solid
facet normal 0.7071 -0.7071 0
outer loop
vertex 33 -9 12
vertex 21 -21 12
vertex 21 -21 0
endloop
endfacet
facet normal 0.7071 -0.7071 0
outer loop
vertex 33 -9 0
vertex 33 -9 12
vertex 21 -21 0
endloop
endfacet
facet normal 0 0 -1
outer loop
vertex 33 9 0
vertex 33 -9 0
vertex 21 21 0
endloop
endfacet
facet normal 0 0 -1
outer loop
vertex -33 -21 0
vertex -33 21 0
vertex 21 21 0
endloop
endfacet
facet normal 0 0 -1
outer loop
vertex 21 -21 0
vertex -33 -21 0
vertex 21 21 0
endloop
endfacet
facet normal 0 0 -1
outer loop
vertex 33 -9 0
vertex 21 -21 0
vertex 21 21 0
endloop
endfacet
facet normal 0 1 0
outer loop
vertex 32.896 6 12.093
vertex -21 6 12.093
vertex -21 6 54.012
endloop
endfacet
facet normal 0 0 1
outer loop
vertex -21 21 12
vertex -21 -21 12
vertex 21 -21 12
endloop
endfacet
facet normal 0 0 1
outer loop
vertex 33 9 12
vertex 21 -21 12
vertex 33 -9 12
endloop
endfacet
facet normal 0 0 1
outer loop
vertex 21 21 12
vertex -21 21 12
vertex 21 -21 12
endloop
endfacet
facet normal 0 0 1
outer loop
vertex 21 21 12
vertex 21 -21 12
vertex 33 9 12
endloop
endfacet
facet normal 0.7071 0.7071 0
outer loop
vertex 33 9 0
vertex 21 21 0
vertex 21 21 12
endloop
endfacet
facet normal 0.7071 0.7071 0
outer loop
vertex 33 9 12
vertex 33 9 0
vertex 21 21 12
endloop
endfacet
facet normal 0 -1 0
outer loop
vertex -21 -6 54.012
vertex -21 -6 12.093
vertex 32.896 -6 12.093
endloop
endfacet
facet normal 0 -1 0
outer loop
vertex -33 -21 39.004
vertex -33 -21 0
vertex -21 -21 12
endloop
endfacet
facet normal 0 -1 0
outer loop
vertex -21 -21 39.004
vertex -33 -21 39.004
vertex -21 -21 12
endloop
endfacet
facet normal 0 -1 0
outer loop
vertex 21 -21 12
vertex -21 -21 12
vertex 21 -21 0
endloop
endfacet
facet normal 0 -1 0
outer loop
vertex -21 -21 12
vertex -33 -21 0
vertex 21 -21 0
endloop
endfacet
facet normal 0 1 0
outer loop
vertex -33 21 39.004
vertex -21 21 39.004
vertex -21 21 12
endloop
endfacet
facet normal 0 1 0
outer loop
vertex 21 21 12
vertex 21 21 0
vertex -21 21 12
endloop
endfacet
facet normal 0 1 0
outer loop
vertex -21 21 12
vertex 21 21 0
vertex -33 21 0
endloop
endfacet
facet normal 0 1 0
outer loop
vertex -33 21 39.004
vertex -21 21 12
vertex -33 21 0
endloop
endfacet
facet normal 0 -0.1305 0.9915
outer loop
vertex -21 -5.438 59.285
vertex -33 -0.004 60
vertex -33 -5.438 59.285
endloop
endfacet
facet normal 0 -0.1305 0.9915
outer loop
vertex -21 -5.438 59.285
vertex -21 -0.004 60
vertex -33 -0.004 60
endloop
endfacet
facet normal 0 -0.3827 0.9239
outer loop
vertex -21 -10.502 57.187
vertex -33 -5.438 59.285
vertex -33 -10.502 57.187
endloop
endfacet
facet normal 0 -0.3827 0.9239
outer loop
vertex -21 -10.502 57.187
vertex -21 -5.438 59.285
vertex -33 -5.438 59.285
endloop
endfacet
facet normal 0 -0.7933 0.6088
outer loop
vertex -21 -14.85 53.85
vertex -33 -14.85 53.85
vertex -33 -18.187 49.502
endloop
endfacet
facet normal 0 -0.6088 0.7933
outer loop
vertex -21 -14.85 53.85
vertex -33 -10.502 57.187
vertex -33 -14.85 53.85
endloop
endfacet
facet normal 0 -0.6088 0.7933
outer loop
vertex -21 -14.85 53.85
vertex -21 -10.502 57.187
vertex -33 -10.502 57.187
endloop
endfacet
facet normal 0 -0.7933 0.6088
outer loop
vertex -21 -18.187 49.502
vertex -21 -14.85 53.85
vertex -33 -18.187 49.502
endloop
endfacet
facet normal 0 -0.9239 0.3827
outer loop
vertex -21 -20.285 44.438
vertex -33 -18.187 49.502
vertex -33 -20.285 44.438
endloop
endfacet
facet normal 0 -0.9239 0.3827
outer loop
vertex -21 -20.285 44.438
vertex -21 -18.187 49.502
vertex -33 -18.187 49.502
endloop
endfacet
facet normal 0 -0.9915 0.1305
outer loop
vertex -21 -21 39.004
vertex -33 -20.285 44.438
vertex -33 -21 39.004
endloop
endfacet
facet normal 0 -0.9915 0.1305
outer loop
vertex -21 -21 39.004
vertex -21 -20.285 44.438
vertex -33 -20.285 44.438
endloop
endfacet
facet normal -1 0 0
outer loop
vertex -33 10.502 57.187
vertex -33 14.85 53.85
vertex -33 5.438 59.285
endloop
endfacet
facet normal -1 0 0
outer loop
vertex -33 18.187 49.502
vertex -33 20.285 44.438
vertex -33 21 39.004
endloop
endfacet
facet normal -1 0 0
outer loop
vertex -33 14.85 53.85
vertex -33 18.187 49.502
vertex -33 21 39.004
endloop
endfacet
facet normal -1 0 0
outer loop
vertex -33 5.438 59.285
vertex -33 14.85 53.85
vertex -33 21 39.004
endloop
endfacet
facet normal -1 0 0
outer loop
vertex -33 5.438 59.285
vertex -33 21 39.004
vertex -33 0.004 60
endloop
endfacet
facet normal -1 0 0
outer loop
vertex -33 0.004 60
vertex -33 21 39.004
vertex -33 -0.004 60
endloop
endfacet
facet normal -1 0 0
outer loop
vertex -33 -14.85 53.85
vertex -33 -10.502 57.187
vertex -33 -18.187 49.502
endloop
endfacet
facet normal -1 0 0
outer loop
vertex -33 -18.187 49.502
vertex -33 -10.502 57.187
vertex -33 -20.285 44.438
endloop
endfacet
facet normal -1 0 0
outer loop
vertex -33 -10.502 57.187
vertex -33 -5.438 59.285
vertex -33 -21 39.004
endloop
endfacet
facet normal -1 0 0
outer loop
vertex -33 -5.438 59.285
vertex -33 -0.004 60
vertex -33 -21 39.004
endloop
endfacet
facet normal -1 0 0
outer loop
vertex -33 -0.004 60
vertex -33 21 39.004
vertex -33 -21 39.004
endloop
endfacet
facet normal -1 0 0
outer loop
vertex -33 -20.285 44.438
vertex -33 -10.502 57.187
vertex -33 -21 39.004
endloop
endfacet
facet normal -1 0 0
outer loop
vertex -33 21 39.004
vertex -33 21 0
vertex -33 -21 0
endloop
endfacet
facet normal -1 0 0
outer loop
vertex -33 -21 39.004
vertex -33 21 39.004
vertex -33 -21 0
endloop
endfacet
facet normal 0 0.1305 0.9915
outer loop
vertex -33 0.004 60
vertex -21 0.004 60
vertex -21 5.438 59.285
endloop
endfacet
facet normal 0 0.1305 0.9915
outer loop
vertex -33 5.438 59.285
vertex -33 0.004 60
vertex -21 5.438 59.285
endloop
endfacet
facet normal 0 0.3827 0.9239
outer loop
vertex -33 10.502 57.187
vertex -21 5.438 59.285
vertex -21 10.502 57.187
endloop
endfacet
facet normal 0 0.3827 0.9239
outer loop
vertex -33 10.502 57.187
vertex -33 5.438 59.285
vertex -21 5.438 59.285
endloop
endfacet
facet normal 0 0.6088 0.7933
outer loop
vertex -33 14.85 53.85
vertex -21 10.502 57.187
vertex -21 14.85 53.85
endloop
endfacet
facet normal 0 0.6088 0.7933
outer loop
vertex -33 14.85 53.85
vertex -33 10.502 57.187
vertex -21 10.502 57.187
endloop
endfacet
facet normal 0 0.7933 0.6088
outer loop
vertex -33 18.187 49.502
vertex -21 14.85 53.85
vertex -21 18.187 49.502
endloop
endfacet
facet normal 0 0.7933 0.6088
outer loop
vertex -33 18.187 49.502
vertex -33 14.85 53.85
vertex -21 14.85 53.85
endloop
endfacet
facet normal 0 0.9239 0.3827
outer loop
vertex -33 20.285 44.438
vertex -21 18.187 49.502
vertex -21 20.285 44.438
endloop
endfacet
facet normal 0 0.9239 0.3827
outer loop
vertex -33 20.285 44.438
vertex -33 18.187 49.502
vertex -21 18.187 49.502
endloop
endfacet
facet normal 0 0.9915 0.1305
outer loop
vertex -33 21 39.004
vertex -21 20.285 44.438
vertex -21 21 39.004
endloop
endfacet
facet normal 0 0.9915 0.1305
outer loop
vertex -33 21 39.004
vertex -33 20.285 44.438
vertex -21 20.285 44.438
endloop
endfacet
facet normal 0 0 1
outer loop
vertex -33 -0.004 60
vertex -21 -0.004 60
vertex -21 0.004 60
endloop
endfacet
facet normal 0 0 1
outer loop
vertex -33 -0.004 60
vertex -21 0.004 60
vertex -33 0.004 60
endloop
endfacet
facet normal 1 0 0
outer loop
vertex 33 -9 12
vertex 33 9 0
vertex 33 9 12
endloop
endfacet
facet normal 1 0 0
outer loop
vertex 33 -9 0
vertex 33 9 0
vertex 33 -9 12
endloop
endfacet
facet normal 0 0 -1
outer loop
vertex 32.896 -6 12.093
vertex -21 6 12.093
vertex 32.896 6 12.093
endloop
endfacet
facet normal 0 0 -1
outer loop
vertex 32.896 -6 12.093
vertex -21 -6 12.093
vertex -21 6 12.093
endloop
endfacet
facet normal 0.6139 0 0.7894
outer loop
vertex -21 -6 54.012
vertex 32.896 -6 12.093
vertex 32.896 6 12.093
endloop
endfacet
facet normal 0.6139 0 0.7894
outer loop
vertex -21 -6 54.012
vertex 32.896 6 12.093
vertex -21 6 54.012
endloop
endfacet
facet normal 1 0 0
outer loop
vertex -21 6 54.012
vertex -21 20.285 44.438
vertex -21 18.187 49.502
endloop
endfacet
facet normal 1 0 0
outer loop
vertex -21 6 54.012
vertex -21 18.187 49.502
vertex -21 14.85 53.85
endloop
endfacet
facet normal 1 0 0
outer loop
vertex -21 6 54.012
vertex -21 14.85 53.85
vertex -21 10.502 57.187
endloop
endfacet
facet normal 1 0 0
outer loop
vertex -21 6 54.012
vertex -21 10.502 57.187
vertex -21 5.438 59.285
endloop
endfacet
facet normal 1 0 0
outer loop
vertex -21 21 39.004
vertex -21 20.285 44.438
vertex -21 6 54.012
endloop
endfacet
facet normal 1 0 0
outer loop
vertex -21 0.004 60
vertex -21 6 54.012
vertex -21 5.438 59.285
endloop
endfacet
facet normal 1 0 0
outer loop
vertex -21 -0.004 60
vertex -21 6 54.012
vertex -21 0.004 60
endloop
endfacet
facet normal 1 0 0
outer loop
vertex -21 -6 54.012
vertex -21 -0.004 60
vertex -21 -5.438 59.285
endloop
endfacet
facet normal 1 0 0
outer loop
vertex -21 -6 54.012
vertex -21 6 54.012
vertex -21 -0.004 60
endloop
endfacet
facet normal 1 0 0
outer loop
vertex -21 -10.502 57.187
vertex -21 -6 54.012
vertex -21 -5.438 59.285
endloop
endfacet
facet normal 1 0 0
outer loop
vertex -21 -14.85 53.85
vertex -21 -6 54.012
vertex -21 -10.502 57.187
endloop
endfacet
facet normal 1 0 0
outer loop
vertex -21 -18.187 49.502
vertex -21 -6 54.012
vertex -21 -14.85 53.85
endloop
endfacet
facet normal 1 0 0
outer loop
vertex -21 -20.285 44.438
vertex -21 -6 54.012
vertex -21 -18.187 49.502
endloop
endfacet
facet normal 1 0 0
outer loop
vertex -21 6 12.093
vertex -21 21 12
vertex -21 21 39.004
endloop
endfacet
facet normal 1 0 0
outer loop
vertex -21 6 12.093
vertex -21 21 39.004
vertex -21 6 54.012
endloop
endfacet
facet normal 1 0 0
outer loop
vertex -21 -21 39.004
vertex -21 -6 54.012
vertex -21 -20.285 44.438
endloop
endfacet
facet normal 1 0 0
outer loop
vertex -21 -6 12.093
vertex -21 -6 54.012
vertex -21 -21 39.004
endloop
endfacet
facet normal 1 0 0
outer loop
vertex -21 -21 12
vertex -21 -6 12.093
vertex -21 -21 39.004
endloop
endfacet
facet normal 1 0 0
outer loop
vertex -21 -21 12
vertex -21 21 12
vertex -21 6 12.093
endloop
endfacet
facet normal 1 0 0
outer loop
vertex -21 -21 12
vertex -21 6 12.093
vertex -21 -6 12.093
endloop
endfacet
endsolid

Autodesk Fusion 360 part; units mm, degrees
sketch "Sketch1" plane through (0, 0, 0) normal (0, 0, 1) x (1, 0, 0)
  line L0 (33, -21) -> (-33, -21)
  line L1 (-33, -21) -> (-33, 21)
  line L2 (-33, 21) -> (33, 21)
  line L3 (33, 21) -> (33, -21)
  line L4 (33, -21) -> (-33, 21) construction
  line L5 (-33, -21) -> (33, 21) construction
  dimension "d1" = 66
  dimension "d2" = 42
extrude "Extrude1" add sketch "Sketch1" along normal blind 12
chamfer "Chamfer1" distance 12 angle 45 2 edges at (33, -21, 6) (33, 21, 6)
sketch "Sketch2" plane through (0, 0, 12) normal (0, 0, 1) x (-1, 0, 0)
  line L0 (-33, -9) -> (-21, -21)
  line L1 (-21, -21) -> (33, -21)
  line L2 (33, -21) -> (33, 21)
  line L3 (33, 21) -> (-21, 21)
  line L4 (-21, 21) -> (-33, 9)
  line L5 (-33, 9) -> (-33, -9)
  line L6 (33, -21) -> (21, -21)
  line L7 (21, -21) -> (21, 21)
  line L8 (21, 21) -> (33, 21)
  line L9 (33, 21) -> (33, -21)
  dimension "d6" = 12
extrude "Extrude2" add sketch "Sketch2" along normal blind 48 contours L1 L2 L3 L6 L7 L8 L9
fillet "Fillet1" radius 21 2 edges at (-27, -21, 60) (-27, 21, 60)
sketch "Sketch3" plane through (0, 0, 0) normal (0, 1, 0) x (1, 0, 0)
  line L0 (-21.1039, -54.093) -> (-21.1039, -12.093)
  line L1 (-21.1039, -12.093) -> (32.8961, -12.093)
  line L2 (32.8961, -12.093) -> (-21.1039, -54.093)
  dimension "d10" = 42
  dimension "d11" = 54
extrude "Extrude3" add sketch "Sketch3" along normal mid plane 12
equation "d7 = 60 mm - 12 mm"
equation "d11 = 66 mm - 12 mm"
